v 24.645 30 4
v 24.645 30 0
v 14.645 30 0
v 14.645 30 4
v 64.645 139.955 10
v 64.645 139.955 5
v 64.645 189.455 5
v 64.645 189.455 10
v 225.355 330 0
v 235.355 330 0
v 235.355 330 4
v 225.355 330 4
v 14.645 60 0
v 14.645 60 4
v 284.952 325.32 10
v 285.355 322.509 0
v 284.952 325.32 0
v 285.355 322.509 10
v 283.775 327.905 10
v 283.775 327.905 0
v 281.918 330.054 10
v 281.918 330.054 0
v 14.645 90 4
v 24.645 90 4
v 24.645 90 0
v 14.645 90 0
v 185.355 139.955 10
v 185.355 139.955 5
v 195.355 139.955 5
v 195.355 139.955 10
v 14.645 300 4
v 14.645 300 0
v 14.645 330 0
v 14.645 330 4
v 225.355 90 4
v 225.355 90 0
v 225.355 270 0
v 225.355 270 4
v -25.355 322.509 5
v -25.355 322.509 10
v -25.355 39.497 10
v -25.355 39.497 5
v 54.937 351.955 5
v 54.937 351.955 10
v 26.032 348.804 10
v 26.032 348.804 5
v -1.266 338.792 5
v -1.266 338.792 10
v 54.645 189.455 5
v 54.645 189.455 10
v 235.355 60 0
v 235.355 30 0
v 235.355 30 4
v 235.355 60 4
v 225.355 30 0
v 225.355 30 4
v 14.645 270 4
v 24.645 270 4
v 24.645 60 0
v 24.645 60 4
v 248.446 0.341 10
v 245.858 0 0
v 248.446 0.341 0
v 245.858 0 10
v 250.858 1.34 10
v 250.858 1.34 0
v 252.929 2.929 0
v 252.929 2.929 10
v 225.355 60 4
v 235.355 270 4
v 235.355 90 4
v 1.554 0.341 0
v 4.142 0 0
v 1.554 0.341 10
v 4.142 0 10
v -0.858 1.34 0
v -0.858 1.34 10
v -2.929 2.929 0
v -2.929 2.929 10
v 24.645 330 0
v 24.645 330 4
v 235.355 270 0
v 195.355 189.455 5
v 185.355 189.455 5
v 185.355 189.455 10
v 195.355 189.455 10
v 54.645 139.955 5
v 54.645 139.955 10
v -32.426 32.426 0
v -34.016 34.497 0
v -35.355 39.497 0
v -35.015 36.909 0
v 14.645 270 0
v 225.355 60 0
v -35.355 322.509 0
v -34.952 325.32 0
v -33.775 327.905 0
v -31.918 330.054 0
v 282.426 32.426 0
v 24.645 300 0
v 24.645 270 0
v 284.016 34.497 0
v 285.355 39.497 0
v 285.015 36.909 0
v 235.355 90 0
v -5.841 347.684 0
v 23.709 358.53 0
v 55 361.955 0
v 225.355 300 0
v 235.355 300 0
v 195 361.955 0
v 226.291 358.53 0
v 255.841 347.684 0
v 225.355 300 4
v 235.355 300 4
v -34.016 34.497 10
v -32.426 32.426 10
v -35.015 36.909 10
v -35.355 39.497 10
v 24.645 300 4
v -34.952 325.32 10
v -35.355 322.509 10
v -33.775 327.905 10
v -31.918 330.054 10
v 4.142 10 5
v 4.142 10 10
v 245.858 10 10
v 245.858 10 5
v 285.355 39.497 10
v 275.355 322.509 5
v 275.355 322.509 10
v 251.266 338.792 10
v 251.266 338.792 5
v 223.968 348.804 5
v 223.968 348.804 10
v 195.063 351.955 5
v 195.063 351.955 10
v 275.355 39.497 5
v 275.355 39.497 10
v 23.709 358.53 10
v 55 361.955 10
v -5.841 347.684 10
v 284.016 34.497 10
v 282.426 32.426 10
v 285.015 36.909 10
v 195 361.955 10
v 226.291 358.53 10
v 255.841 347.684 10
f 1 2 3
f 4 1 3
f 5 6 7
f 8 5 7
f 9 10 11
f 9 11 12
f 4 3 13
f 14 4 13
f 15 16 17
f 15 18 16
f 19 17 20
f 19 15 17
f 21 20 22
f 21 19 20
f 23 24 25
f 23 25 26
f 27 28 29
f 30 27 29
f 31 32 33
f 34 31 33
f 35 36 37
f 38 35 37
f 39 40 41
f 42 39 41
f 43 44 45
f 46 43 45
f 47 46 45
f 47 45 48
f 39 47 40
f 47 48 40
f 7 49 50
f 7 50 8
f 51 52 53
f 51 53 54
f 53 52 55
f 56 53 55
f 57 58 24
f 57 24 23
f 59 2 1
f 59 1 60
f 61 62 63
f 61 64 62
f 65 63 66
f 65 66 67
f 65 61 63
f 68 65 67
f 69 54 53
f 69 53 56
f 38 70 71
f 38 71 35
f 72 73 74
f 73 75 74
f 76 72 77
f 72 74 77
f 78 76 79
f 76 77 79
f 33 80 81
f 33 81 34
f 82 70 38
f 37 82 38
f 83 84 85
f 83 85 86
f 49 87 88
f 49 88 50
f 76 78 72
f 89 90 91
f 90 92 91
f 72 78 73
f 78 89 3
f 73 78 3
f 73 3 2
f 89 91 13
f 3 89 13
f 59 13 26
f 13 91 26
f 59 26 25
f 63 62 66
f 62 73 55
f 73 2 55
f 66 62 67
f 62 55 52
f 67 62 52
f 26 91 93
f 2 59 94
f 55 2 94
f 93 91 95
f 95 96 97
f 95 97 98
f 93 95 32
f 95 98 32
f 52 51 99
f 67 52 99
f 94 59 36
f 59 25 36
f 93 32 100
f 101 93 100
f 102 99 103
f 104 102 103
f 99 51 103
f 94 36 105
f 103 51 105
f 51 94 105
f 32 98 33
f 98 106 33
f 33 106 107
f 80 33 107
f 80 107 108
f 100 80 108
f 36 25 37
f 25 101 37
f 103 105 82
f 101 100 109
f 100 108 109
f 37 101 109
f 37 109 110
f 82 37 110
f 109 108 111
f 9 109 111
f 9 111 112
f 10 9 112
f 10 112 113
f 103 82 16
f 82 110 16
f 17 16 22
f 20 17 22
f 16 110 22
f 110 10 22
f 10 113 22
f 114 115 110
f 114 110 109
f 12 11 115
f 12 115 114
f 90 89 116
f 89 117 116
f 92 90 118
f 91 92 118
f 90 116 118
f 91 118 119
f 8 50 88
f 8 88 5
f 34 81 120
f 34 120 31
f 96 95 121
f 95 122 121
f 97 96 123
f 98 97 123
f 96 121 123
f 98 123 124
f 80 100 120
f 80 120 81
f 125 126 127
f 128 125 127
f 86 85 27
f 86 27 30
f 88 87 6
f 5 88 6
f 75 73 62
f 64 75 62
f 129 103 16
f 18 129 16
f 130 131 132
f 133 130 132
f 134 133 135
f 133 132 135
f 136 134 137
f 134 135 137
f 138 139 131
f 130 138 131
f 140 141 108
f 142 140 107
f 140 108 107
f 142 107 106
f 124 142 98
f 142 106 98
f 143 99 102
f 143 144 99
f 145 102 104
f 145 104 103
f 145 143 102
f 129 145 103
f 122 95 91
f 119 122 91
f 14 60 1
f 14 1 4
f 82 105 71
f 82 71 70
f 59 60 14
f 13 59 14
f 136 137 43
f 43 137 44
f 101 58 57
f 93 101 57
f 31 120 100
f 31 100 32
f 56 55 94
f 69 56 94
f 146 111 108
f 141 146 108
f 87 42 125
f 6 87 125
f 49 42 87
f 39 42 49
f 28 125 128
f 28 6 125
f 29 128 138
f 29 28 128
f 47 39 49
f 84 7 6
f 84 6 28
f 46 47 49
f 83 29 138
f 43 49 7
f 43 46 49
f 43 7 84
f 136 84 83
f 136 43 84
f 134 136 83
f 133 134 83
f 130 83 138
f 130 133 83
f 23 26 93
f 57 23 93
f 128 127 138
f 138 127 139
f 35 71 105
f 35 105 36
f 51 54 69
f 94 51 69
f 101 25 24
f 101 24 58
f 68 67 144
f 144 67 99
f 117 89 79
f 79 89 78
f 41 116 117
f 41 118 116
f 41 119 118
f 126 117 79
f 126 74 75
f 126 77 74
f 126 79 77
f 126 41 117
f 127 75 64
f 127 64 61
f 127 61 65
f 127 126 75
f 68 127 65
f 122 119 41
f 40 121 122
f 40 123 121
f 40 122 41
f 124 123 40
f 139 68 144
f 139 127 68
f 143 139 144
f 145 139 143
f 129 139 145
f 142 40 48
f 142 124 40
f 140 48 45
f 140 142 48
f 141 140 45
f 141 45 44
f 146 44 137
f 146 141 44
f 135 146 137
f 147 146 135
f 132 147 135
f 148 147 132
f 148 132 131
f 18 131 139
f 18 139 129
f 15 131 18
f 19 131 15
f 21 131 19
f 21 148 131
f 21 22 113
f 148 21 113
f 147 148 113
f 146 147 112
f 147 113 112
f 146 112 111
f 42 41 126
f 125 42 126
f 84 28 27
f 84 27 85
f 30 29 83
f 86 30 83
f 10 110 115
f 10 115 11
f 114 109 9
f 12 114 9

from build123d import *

# Parameters (mm, degrees)
BOSS_EXTRUDE1_DEPTH = 10
CUT_EXTRUDE3_DEPTH  = 5
SKETCH5_W           = 10
SKETCH5_H           = 49.5
BOSS_EXTRUDE2_DEPTH = 5
FILLET1_R           = 10
SKETCH6_W           = 10
SKETCH6_H           = 300
CUT_EXTRUDE5_DEPTH  = 4
SKETCH8_W           = 10
SKETCH8_H           = 30
BOSS_EXTRUDE3_DEPTH = 4
SKETCH10_W          = 10
SKETCH10_H          = 300
CUT_EXTRUDE6_DEPTH  = 4
SKETCH11_W          = 10
SKETCH11_H          = 30
BOSS_EXTRUDE4_DEPTH = 4


with BuildPart() as part:
    # Sketch1 → Boss-Extrude1 (new body)
    with BuildSketch(Plane.XY):
        with BuildLine():
            Line((0, 0), (250, 0))
            Line((250, 0), (285.355339059, 35.355339059))
            Line((285.355339059, 35.355339059), (285.355339059, 326.955339059))
            ThreePointArc((285.355339059, 326.955339059), (243.560486982, 353.188356712), (195, 361.955339059))
            Line((195, 361.955339059), (55, 361.955339059))
            ThreePointArc((55, 361.955339059), (6.439513018, 353.188356712), (-35.355339059, 326.955339059))
            Line((-35.355339059, 326.955339059), (-35.355339059, 35.355339059))
            Line((-35.355339059, 35.355339059), (0, 0))
        make_face()
    extrude(amount=BOSS_EXTRUDE1_DEPTH)

    # Sketch4 → Cut-Extrude3 (cut)
    with BuildSketch(Plane.XY.offset(10)):
        with BuildLine():
            Line((-25.355339059, 39.497474683), (4.142135624, 10))
            Line((4.142135624, 10), (245.857864376, 10))
            Line((245.857864376, 10), (275.355339059, 39.497474683))
            Line((275.355339059, 39.497474683), (275.355339059, 322.508901748))
            ThreePointArc((275.355339059, 322.508901748), (237.921386907, 344.627720124), (195.062911656, 351.955339059))
            Line((195.062911656, 351.955339059), (54.937088344, 351.955339059))
            ThreePointArc((54.937088344, 351.955339059), (12.078613093, 344.627720124), (-25.355339059, 322.508901748))
            Line((-25.355339059, 322.508901748), (-25.355339059, 39.497474683))
        make_face()
    extrude(amount=-CUT_EXTRUDE3_DEPTH, mode=Mode.SUBTRACT)

    # Sketch5 → Boss-Extrude2 (add)
    with BuildSketch(Plane.XY.offset(5)):
        with Locations((59.644660941, 164.705339059)):
            Rectangle(SKETCH5_W, SKETCH5_H)
        with Locations((190.355339059, 164.705339059)):
            Rectangle(SKETCH5_W, SKETCH5_H)
    extrude(amount=BOSS_EXTRUDE2_DEPTH)

    # Fillet1
    fillet1_edges = [part.edges().sort_by_distance(p)[0] for p in [
        (-35.355339059, 35.355339059, 5),
        (-35.355339059, 326.955339059, 5),
        (285.355339059, 326.955339059, 5),
        (285.355339059, 35.355339059, 5),
        (250, 0, 5),
        (0, 0, 5),
    ]]
    fillet(fillet1_edges, radius=FILLET1_R)

    # Sketch6 → Cut-Extrude5 (cut)
    with BuildSketch(Plane(origin=(0, 0, 0), x_dir=(-1, 0, 0), z_dir=(0, 0, -1))):
        with Locations((-230.355339059, 180)):
            Rectangle(SKETCH6_W, SKETCH6_H)
    extrude(amount=-CUT_EXTRUDE5_DEPTH, mode=Mode.SUBTRACT)

    # Sketch8 → Boss-Extrude3 (add)
    with BuildSketch(Plane(origin=(0, 0, 4), x_dir=(-1, 0, 0), z_dir=(0, 0, -1))):
        with Locations((-230.355339059, 285)):
            Rectangle(SKETCH8_W, SKETCH8_H)
        with Locations((-230.355339059, 75)):
            Rectangle(SKETCH8_W, SKETCH8_H)
    extrude(amount=BOSS_EXTRUDE3_DEPTH)

    # Sketch10 → Cut-Extrude6 (cut)
    with BuildSketch(Plane(origin=(0, 0, 0), x_dir=(-1, 0, 0), z_dir=(0, 0, -1))):
        with Locations((-19.644660941, 180)):
            Rectangle(SKETCH10_W, SKETCH10_H)
    extrude(amount=-CUT_EXTRUDE6_DEPTH, mode=Mode.SUBTRACT)

    # Sketch11 → Boss-Extrude4 (add)
    with BuildSketch(Plane(origin=(0, 0, 4), x_dir=(-1, 0, 0), z_dir=(0, 0, -1))):
        with Locations((-19.644660941, 75)):
            Rectangle(SKETCH11_W, SKETCH11_H)
        with Locations((-19.644660941, 285)):
            Rectangle(SKETCH11_W, SKETCH11_H)
    extrude(amount=BOSS_EXTRUDE4_DEPTH)


solid = part.part
